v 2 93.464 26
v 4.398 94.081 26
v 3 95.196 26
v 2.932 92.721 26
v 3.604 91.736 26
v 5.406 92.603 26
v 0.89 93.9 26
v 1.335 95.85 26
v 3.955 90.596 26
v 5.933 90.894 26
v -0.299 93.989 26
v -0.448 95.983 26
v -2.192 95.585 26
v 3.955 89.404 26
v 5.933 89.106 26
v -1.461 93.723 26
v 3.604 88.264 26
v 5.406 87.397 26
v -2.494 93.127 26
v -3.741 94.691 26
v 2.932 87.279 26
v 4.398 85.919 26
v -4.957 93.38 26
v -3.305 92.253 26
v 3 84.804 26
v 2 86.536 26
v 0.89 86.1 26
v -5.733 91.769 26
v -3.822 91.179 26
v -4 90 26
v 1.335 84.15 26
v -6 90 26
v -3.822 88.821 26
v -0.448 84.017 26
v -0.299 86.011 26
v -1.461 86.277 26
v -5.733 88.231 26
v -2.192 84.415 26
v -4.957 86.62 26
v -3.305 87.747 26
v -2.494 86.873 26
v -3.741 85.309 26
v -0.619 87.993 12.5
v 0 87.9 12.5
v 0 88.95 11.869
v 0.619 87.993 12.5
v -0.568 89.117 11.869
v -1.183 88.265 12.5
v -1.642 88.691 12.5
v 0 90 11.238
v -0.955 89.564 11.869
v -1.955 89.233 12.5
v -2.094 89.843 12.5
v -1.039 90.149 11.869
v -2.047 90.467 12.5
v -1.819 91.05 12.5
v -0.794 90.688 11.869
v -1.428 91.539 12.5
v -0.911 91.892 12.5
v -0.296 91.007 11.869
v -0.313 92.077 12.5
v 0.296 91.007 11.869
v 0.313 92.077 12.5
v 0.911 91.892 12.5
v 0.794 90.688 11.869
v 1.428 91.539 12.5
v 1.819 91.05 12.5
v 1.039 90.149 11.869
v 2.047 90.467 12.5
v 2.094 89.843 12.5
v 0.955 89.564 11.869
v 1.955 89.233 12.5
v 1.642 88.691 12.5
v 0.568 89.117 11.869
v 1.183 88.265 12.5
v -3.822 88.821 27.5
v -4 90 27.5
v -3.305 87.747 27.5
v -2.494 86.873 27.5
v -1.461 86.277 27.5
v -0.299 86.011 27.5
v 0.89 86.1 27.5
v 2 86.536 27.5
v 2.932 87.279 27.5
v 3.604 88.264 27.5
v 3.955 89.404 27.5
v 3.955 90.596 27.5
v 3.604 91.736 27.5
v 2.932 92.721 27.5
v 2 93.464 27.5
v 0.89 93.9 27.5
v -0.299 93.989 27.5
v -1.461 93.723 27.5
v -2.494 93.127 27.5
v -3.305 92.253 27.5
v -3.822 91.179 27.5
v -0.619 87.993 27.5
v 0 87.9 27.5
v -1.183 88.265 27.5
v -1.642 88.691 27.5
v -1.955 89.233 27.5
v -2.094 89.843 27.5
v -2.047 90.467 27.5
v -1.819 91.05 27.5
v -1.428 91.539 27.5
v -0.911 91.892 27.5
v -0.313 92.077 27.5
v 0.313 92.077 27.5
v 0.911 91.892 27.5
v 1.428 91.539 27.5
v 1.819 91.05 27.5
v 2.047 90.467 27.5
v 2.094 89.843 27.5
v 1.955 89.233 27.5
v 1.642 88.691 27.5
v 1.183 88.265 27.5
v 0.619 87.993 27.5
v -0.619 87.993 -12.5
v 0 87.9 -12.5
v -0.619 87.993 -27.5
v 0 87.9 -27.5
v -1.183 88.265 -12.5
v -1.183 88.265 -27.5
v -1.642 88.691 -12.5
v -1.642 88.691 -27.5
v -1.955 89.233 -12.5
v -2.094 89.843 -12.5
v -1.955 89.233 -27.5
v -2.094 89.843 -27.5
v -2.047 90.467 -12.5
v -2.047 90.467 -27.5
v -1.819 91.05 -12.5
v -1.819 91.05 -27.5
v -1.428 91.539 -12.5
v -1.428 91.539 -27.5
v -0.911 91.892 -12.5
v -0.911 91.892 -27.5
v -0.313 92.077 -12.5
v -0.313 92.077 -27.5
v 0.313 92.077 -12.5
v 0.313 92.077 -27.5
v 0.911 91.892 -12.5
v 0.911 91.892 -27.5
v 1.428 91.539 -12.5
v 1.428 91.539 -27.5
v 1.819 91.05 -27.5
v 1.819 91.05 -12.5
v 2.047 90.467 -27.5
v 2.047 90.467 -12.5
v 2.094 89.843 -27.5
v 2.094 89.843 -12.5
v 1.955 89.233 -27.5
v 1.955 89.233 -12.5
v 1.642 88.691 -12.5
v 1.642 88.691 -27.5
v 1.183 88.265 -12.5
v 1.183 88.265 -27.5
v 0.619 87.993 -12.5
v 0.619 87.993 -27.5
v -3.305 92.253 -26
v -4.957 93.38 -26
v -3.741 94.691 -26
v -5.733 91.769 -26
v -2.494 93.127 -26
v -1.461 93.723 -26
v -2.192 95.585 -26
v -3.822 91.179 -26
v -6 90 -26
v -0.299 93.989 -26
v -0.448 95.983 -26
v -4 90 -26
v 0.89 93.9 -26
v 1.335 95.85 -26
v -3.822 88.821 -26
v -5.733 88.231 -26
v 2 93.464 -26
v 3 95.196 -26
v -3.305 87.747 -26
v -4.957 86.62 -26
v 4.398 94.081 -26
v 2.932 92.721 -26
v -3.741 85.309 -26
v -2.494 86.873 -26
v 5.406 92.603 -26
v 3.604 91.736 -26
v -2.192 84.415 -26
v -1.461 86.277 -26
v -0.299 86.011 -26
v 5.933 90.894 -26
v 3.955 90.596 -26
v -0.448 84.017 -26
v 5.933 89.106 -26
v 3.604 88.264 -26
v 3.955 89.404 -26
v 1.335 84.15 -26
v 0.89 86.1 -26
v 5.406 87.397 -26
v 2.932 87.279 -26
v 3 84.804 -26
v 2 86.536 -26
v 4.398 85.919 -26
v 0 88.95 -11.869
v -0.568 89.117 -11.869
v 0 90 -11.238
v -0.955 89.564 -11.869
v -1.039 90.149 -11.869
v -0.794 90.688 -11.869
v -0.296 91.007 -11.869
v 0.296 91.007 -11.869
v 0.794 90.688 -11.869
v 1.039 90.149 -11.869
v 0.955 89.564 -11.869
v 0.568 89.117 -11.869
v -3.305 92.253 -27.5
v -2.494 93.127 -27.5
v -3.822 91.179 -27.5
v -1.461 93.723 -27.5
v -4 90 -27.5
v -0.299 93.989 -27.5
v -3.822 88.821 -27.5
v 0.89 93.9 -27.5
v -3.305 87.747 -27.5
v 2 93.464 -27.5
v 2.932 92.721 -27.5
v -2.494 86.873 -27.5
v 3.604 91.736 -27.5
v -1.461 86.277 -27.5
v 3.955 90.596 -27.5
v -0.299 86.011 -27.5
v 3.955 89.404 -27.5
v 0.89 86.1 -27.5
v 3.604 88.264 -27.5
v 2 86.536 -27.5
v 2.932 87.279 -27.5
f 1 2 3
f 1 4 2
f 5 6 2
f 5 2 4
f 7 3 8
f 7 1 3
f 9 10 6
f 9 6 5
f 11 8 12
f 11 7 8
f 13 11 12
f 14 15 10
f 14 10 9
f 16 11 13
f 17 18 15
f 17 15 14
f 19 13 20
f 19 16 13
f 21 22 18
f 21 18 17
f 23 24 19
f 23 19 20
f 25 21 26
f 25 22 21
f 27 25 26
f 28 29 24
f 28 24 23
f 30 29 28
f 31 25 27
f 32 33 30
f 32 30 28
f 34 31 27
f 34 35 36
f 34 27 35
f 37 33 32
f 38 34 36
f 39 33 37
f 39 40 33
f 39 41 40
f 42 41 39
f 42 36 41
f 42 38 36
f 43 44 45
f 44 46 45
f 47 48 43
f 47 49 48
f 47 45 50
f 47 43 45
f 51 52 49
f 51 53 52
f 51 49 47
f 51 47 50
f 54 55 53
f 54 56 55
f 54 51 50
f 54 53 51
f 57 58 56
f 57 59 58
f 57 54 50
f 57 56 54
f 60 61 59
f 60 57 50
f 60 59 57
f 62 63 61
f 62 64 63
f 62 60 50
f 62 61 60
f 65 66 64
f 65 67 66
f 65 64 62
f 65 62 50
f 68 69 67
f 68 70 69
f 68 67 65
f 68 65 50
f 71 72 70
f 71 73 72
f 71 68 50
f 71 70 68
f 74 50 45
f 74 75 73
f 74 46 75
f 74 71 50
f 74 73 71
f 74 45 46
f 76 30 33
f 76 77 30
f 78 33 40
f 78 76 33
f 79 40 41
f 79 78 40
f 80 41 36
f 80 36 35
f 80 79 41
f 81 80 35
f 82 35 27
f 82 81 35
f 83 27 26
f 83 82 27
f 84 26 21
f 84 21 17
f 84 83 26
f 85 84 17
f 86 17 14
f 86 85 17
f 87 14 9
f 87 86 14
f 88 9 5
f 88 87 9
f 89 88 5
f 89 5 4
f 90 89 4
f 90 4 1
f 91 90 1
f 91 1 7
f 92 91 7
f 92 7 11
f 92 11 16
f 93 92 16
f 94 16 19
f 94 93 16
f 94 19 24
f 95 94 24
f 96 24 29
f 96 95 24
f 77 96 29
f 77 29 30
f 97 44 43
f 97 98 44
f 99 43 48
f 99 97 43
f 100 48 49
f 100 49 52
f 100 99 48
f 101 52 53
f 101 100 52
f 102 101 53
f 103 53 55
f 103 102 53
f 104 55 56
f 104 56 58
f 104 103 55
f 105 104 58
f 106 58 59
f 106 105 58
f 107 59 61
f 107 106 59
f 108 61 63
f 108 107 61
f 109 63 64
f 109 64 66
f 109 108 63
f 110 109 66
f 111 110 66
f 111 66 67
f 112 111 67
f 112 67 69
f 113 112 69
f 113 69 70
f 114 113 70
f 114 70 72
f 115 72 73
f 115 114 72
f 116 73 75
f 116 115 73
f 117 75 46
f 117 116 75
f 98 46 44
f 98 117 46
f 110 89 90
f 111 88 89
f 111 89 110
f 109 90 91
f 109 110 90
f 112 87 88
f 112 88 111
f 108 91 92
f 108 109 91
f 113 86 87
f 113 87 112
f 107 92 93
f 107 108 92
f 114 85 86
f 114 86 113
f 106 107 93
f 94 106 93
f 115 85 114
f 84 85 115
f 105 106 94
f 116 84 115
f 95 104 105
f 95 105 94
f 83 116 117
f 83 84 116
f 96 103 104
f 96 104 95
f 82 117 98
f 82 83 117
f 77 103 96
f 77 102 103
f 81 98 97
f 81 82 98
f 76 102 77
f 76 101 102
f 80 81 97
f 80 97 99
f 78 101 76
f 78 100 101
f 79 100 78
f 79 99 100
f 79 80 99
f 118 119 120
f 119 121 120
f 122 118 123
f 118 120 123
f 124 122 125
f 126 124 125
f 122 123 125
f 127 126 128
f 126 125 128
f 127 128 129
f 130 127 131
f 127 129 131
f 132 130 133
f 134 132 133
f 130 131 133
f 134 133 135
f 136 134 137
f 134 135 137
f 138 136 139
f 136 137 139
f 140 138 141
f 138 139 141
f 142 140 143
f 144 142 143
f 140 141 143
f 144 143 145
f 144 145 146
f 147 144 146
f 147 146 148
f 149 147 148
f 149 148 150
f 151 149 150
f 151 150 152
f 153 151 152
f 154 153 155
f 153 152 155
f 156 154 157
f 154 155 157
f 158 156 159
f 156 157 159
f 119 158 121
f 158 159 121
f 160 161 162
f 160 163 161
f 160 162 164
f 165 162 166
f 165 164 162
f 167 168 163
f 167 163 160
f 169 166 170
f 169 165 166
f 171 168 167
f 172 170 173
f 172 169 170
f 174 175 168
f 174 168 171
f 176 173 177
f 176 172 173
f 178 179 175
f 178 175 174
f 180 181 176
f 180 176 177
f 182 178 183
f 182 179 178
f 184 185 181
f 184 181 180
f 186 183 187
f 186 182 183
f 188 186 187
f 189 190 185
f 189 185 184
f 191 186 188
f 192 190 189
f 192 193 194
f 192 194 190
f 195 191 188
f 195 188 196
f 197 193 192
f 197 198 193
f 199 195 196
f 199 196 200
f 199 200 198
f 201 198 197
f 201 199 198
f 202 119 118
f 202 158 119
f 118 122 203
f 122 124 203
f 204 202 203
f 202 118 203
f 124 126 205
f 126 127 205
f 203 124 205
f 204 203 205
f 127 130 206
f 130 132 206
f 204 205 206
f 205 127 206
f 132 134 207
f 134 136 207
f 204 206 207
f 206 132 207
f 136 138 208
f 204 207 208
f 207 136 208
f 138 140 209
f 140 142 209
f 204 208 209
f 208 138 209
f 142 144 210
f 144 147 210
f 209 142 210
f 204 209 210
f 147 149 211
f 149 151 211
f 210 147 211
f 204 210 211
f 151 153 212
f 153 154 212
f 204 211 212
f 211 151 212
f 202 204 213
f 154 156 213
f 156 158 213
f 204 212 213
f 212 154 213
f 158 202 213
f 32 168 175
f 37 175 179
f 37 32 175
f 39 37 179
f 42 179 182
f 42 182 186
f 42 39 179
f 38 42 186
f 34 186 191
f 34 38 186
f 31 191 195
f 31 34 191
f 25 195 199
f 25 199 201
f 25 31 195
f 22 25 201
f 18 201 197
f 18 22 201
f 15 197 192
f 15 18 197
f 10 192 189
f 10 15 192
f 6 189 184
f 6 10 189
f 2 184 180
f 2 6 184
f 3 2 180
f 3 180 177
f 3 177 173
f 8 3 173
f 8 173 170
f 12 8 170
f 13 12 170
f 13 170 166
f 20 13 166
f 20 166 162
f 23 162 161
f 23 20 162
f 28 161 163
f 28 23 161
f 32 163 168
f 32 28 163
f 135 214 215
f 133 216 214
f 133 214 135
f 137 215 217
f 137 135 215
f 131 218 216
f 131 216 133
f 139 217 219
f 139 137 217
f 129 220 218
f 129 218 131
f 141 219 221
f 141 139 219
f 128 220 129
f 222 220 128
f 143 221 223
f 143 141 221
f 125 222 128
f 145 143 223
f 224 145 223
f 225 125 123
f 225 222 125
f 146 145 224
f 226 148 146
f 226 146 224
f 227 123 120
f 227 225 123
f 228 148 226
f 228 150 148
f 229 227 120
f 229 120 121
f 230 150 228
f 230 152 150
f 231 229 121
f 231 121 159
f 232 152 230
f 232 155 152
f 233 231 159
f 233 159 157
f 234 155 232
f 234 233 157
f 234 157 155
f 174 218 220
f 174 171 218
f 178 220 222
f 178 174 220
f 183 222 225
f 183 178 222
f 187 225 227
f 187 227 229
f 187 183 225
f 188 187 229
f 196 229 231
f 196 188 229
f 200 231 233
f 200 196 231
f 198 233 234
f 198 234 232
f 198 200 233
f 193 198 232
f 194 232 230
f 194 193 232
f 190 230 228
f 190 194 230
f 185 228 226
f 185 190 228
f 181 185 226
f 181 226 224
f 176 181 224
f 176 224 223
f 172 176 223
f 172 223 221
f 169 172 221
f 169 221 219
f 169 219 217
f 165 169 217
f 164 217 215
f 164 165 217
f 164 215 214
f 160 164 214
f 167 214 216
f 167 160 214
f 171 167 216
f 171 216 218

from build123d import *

# Parameters (mm, degrees)
M5X0_8_1_AT_2_COUNT = 2
M5X0_8_1_AT_2_PITCH = 90.280227073


with BuildPart() as part:
    # 草图2 → 旋转4 (revolve)
    with BuildSketch(Plane(origin=(0, 0, 0), x_dir=(0, 0, -1), z_dir=(1, 0, 0)), mode=Mode.PRIVATE) as revolve_4_sk:
        Polygon((27.5, 94), (26, 94), (26, 96), (-26, 96), (-26, 94), (-27.5, 94), (-27.5, 90), (27.5, 90), align=None)
    revolve(revolve_4_sk.sketch.rotate(Axis((0, 90, -27.5), (0, 0, 1)), 90), axis=Axis((0, 90, -27.5), (0, 0, 1)))

    # 草图5 → M5x0.8 螺纹孔的螺纹孔钻头1 (revolve, cut)
    with BuildSketch(Plane(origin=(0, 90, 27.5), x_dir=(0, -1, 0), z_dir=(1, 0, 0))):
        Polygon((0, 0), (0, 16.2618073), (2.1, 15), (2.1, 0), align=None)
    m5x0_8_1 = revolve(axis=Axis((0, 90, 33.85), (0, 0, -1)), mode=Mode.SUBTRACT)

    # M5x0.8 螺纹孔的螺纹孔钻头1 at 2: M5x0.8 螺纹孔的螺纹孔钻头1 ×2
    with Locations(*[Vector(-0.6431998246516509, -0.765698364611082, 0) * (i * M5X0_8_1_AT_2_PITCH) for i in range(1, M5X0_8_1_AT_2_COUNT)]):
        add(m5x0_8_1, mode=Mode.SUBTRACT)

    # 镜向1: M5x0.8 螺纹孔的螺纹孔钻头1 across plane
    add(m5x0_8_1.mirror(Plane.XY), mode=Mode.SUBTRACT)

    # 镜向1 copy 1 sketch → 镜向1 copy 1 (revolve, cut)
    with BuildSketch(Plane(origin=(-58.068226223, 20.872577773, -27.5), x_dir=(0, -1, 0), z_dir=(1, 0, 0))):
        Polygon((0, 0), (0, -16.2618073), (2.1, -15), (2.1, 0), align=None)
    revolve(axis=Axis((-58.068226223, 20.872577773, -33.85), (0, 0, -1)), mode=Mode.SUBTRACT)


solid = part.part
